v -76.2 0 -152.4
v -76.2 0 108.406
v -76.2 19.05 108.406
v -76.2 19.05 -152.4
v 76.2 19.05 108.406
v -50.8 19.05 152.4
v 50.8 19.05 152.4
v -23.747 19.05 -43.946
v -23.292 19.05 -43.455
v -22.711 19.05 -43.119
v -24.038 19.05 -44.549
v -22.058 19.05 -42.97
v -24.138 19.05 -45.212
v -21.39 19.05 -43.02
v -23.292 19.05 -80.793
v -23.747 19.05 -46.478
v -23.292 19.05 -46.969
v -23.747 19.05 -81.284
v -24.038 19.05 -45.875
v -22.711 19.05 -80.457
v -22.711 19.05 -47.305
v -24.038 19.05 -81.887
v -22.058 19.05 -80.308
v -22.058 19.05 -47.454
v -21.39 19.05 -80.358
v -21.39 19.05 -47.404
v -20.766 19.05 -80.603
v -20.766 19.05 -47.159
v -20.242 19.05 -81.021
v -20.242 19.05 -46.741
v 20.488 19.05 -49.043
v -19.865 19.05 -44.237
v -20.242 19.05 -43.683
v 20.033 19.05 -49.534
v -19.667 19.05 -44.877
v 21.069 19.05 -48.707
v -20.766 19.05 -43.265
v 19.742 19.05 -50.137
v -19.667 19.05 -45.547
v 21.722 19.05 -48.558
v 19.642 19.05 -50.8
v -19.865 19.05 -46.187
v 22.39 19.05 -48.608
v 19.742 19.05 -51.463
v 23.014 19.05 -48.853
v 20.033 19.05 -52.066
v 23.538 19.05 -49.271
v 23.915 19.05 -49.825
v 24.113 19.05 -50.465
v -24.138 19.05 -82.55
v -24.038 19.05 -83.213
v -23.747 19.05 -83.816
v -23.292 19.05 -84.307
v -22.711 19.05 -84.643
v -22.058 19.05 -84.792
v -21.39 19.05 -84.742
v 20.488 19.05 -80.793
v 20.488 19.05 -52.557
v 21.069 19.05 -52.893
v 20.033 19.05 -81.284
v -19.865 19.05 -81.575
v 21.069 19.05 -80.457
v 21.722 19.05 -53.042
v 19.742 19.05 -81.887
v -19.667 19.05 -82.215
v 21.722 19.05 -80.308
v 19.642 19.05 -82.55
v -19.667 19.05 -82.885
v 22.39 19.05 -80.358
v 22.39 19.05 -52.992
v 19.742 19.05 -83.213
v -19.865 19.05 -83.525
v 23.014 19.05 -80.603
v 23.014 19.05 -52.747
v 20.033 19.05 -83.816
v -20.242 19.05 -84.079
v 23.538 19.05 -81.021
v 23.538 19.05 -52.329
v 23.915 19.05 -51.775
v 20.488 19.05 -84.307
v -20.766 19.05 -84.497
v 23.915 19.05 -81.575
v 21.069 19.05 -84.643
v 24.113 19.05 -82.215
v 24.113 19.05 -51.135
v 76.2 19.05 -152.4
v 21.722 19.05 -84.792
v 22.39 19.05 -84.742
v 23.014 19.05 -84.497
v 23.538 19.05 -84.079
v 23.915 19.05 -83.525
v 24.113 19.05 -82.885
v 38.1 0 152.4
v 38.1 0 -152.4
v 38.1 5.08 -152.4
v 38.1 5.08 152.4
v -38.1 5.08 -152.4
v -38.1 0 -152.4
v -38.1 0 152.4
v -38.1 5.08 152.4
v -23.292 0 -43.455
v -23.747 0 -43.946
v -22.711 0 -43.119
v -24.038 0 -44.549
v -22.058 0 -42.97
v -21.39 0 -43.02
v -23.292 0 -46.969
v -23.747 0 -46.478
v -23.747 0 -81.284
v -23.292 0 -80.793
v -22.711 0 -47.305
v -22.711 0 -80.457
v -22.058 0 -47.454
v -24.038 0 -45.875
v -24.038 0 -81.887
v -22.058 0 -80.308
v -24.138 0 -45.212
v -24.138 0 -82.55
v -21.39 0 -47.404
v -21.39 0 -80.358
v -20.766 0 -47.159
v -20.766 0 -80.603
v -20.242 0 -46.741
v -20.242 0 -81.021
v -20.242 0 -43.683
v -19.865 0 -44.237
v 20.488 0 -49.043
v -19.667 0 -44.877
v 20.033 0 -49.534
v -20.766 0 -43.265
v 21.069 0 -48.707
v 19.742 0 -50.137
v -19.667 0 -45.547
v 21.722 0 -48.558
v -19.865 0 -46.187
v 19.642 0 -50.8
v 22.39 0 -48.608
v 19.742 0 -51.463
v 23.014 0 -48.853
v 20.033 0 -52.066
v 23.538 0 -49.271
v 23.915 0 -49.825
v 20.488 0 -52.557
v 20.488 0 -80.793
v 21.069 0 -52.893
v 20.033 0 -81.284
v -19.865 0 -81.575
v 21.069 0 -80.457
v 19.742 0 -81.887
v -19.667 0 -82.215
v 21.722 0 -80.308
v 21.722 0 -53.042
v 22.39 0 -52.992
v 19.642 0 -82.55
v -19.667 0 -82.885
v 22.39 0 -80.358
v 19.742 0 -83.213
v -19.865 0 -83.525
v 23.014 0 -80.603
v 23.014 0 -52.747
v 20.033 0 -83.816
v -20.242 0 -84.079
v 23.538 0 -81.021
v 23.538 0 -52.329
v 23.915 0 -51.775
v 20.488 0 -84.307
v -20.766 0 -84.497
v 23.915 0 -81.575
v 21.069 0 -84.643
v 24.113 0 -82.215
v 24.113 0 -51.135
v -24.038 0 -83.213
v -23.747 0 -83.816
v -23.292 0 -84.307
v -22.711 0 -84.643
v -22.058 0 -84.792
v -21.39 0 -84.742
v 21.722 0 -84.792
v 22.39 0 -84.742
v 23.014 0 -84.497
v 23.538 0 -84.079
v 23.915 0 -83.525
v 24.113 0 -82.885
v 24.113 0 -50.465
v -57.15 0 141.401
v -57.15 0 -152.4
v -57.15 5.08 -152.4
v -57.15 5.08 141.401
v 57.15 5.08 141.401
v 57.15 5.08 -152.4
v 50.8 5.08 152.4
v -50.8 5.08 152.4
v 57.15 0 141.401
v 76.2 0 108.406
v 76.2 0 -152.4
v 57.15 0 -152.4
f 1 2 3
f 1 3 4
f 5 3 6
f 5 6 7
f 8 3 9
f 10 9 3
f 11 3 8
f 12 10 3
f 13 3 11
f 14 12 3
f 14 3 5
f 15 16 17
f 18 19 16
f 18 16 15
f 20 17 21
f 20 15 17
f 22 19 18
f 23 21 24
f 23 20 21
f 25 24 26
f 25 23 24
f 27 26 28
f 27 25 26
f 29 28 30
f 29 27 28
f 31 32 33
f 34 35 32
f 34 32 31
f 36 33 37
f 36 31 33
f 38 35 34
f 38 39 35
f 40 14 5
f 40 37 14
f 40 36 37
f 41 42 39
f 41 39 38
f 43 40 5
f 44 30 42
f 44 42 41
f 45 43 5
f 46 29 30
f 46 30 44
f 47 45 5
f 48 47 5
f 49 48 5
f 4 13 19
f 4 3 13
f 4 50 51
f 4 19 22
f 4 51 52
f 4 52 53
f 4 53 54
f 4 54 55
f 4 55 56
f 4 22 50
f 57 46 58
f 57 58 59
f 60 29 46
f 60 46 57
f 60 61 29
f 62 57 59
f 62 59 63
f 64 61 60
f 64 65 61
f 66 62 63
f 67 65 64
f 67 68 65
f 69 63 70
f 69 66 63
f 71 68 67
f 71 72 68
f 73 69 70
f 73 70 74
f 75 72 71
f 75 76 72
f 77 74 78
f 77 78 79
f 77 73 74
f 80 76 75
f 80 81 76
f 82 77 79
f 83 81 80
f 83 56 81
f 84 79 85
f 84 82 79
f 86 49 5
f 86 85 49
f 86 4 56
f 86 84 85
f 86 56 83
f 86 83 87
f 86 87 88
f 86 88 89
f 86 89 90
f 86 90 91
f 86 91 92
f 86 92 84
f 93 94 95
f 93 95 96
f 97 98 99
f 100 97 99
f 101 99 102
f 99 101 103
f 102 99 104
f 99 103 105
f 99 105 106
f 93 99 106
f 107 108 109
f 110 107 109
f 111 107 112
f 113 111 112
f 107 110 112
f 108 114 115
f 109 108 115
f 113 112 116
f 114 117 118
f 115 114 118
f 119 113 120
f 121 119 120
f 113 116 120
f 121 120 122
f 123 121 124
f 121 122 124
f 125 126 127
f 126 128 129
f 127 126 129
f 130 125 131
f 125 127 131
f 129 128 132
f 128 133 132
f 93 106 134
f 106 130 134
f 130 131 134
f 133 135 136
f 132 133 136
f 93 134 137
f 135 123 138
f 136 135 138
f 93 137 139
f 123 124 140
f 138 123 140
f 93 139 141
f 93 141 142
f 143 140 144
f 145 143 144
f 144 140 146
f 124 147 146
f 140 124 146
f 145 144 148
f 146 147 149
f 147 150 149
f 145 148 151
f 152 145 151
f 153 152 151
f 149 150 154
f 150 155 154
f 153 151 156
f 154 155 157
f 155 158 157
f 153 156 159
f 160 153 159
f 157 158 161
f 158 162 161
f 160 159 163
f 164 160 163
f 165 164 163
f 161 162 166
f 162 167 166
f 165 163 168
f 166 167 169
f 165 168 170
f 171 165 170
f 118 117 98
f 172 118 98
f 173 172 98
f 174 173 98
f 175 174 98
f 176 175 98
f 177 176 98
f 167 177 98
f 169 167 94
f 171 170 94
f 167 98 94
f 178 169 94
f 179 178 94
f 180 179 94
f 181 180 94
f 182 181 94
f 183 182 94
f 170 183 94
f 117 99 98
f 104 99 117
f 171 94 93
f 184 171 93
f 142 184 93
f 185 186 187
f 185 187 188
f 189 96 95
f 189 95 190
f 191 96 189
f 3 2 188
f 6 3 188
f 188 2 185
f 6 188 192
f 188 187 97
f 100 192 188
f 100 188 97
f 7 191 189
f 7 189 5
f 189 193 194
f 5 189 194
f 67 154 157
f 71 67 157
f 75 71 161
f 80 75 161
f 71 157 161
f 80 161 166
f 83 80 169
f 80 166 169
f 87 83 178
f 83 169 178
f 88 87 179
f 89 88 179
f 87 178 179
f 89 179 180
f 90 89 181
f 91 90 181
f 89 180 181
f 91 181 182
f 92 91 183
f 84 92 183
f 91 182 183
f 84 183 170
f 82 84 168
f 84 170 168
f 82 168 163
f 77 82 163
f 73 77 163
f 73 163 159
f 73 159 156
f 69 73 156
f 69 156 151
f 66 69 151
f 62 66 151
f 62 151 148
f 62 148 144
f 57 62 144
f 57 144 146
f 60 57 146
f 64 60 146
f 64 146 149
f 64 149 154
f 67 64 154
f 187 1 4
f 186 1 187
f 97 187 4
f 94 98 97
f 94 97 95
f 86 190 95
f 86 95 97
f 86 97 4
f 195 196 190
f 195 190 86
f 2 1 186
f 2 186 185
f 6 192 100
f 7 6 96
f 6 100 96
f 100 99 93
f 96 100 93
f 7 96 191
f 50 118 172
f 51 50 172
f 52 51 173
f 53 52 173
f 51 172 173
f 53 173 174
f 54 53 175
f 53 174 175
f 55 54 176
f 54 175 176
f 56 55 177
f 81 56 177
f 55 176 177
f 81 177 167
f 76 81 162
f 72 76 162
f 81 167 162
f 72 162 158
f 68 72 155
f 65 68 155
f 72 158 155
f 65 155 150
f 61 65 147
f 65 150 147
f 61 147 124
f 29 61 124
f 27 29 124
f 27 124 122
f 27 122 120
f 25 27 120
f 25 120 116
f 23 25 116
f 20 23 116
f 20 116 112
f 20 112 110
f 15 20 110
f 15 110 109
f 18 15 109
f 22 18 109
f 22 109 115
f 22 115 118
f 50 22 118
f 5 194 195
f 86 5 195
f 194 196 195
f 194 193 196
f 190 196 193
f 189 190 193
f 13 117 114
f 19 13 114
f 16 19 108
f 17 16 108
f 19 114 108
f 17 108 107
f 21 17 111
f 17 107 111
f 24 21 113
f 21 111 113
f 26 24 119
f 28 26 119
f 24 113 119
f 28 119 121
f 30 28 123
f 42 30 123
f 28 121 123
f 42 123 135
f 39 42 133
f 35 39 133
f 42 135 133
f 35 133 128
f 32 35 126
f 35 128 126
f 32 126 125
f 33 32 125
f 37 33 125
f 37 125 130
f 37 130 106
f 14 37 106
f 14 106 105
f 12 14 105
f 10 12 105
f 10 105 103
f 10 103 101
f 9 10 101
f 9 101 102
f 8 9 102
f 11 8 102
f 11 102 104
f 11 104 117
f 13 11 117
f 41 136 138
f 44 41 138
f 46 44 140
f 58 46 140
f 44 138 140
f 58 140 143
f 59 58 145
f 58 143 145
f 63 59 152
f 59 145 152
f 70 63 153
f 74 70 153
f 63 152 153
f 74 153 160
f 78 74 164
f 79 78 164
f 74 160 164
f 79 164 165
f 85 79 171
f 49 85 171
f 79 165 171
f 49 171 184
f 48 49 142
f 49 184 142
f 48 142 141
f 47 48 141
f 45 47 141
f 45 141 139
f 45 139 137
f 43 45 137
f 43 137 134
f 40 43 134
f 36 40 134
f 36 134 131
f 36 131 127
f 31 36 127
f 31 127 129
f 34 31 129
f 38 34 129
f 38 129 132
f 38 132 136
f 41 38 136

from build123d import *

# Parameters (mm, degrees)
SKETCH1_W             = 152.4
SKETCH1_H             = 304.8
BOSS_EXTRUDE1_DEPTH   = 19.05
F_8_CLEARANCE_HOLE1_D = 4.4958
CUT_EXTRUDE1_DEPTH    = 20.05
SKETCH5_W             = 19.05
SKETCH5_H             = 304.8
CUT_EXTRUDE2_DEPTH    = 5.08


with BuildPart() as part:
    # Sketch1 → Boss-Extrude1 (new body)
    with BuildSketch(Plane(origin=(0, 0, 0), x_dir=(1, 0, 0), z_dir=(0, 1, 0))):
        Rectangle(SKETCH1_W, SKETCH1_H)
    extrude(amount=BOSS_EXTRUDE1_DEPTH)

    # #8 Clearance Hole1 (through all)
    with Locations(Plane(origin=(0, 19.05, 0), x_dir=(1, 0, 0), z_dir=(0, 1, 0))):
        with Locations((-21.89, 82.55), (21.89, 82.55), (-21.89, 45.212), (21.89, 50.8)):
            Hole(F_8_CLEARANCE_HOLE1_D / 2)

    # Sketch4 → Cut-Extrude1 (cut, through all)
    with BuildSketch(Plane.XZ):
        Polygon((76.2, 152.4), (50.8, 152.4), (76.2, 108.405909488), align=None)
        Polygon((-76.2, 108.405909488), (-50.8, 152.4), (-76.2, 152.4), align=None)
    extrude(amount=-CUT_EXTRUDE1_DEPTH, mode=Mode.SUBTRACT)

    # Sketch5 → Cut-Extrude2 (cut)
    with BuildSketch(Plane.XZ):
        with Locations((47.625, 0)):
            Rectangle(SKETCH5_W, SKETCH5_H)
        with Locations((-47.625, 0)):
            Rectangle(SKETCH5_W, SKETCH5_H)
    extrude(amount=-CUT_EXTRUDE2_DEPTH, mode=Mode.SUBTRACT)


solid = part.part
